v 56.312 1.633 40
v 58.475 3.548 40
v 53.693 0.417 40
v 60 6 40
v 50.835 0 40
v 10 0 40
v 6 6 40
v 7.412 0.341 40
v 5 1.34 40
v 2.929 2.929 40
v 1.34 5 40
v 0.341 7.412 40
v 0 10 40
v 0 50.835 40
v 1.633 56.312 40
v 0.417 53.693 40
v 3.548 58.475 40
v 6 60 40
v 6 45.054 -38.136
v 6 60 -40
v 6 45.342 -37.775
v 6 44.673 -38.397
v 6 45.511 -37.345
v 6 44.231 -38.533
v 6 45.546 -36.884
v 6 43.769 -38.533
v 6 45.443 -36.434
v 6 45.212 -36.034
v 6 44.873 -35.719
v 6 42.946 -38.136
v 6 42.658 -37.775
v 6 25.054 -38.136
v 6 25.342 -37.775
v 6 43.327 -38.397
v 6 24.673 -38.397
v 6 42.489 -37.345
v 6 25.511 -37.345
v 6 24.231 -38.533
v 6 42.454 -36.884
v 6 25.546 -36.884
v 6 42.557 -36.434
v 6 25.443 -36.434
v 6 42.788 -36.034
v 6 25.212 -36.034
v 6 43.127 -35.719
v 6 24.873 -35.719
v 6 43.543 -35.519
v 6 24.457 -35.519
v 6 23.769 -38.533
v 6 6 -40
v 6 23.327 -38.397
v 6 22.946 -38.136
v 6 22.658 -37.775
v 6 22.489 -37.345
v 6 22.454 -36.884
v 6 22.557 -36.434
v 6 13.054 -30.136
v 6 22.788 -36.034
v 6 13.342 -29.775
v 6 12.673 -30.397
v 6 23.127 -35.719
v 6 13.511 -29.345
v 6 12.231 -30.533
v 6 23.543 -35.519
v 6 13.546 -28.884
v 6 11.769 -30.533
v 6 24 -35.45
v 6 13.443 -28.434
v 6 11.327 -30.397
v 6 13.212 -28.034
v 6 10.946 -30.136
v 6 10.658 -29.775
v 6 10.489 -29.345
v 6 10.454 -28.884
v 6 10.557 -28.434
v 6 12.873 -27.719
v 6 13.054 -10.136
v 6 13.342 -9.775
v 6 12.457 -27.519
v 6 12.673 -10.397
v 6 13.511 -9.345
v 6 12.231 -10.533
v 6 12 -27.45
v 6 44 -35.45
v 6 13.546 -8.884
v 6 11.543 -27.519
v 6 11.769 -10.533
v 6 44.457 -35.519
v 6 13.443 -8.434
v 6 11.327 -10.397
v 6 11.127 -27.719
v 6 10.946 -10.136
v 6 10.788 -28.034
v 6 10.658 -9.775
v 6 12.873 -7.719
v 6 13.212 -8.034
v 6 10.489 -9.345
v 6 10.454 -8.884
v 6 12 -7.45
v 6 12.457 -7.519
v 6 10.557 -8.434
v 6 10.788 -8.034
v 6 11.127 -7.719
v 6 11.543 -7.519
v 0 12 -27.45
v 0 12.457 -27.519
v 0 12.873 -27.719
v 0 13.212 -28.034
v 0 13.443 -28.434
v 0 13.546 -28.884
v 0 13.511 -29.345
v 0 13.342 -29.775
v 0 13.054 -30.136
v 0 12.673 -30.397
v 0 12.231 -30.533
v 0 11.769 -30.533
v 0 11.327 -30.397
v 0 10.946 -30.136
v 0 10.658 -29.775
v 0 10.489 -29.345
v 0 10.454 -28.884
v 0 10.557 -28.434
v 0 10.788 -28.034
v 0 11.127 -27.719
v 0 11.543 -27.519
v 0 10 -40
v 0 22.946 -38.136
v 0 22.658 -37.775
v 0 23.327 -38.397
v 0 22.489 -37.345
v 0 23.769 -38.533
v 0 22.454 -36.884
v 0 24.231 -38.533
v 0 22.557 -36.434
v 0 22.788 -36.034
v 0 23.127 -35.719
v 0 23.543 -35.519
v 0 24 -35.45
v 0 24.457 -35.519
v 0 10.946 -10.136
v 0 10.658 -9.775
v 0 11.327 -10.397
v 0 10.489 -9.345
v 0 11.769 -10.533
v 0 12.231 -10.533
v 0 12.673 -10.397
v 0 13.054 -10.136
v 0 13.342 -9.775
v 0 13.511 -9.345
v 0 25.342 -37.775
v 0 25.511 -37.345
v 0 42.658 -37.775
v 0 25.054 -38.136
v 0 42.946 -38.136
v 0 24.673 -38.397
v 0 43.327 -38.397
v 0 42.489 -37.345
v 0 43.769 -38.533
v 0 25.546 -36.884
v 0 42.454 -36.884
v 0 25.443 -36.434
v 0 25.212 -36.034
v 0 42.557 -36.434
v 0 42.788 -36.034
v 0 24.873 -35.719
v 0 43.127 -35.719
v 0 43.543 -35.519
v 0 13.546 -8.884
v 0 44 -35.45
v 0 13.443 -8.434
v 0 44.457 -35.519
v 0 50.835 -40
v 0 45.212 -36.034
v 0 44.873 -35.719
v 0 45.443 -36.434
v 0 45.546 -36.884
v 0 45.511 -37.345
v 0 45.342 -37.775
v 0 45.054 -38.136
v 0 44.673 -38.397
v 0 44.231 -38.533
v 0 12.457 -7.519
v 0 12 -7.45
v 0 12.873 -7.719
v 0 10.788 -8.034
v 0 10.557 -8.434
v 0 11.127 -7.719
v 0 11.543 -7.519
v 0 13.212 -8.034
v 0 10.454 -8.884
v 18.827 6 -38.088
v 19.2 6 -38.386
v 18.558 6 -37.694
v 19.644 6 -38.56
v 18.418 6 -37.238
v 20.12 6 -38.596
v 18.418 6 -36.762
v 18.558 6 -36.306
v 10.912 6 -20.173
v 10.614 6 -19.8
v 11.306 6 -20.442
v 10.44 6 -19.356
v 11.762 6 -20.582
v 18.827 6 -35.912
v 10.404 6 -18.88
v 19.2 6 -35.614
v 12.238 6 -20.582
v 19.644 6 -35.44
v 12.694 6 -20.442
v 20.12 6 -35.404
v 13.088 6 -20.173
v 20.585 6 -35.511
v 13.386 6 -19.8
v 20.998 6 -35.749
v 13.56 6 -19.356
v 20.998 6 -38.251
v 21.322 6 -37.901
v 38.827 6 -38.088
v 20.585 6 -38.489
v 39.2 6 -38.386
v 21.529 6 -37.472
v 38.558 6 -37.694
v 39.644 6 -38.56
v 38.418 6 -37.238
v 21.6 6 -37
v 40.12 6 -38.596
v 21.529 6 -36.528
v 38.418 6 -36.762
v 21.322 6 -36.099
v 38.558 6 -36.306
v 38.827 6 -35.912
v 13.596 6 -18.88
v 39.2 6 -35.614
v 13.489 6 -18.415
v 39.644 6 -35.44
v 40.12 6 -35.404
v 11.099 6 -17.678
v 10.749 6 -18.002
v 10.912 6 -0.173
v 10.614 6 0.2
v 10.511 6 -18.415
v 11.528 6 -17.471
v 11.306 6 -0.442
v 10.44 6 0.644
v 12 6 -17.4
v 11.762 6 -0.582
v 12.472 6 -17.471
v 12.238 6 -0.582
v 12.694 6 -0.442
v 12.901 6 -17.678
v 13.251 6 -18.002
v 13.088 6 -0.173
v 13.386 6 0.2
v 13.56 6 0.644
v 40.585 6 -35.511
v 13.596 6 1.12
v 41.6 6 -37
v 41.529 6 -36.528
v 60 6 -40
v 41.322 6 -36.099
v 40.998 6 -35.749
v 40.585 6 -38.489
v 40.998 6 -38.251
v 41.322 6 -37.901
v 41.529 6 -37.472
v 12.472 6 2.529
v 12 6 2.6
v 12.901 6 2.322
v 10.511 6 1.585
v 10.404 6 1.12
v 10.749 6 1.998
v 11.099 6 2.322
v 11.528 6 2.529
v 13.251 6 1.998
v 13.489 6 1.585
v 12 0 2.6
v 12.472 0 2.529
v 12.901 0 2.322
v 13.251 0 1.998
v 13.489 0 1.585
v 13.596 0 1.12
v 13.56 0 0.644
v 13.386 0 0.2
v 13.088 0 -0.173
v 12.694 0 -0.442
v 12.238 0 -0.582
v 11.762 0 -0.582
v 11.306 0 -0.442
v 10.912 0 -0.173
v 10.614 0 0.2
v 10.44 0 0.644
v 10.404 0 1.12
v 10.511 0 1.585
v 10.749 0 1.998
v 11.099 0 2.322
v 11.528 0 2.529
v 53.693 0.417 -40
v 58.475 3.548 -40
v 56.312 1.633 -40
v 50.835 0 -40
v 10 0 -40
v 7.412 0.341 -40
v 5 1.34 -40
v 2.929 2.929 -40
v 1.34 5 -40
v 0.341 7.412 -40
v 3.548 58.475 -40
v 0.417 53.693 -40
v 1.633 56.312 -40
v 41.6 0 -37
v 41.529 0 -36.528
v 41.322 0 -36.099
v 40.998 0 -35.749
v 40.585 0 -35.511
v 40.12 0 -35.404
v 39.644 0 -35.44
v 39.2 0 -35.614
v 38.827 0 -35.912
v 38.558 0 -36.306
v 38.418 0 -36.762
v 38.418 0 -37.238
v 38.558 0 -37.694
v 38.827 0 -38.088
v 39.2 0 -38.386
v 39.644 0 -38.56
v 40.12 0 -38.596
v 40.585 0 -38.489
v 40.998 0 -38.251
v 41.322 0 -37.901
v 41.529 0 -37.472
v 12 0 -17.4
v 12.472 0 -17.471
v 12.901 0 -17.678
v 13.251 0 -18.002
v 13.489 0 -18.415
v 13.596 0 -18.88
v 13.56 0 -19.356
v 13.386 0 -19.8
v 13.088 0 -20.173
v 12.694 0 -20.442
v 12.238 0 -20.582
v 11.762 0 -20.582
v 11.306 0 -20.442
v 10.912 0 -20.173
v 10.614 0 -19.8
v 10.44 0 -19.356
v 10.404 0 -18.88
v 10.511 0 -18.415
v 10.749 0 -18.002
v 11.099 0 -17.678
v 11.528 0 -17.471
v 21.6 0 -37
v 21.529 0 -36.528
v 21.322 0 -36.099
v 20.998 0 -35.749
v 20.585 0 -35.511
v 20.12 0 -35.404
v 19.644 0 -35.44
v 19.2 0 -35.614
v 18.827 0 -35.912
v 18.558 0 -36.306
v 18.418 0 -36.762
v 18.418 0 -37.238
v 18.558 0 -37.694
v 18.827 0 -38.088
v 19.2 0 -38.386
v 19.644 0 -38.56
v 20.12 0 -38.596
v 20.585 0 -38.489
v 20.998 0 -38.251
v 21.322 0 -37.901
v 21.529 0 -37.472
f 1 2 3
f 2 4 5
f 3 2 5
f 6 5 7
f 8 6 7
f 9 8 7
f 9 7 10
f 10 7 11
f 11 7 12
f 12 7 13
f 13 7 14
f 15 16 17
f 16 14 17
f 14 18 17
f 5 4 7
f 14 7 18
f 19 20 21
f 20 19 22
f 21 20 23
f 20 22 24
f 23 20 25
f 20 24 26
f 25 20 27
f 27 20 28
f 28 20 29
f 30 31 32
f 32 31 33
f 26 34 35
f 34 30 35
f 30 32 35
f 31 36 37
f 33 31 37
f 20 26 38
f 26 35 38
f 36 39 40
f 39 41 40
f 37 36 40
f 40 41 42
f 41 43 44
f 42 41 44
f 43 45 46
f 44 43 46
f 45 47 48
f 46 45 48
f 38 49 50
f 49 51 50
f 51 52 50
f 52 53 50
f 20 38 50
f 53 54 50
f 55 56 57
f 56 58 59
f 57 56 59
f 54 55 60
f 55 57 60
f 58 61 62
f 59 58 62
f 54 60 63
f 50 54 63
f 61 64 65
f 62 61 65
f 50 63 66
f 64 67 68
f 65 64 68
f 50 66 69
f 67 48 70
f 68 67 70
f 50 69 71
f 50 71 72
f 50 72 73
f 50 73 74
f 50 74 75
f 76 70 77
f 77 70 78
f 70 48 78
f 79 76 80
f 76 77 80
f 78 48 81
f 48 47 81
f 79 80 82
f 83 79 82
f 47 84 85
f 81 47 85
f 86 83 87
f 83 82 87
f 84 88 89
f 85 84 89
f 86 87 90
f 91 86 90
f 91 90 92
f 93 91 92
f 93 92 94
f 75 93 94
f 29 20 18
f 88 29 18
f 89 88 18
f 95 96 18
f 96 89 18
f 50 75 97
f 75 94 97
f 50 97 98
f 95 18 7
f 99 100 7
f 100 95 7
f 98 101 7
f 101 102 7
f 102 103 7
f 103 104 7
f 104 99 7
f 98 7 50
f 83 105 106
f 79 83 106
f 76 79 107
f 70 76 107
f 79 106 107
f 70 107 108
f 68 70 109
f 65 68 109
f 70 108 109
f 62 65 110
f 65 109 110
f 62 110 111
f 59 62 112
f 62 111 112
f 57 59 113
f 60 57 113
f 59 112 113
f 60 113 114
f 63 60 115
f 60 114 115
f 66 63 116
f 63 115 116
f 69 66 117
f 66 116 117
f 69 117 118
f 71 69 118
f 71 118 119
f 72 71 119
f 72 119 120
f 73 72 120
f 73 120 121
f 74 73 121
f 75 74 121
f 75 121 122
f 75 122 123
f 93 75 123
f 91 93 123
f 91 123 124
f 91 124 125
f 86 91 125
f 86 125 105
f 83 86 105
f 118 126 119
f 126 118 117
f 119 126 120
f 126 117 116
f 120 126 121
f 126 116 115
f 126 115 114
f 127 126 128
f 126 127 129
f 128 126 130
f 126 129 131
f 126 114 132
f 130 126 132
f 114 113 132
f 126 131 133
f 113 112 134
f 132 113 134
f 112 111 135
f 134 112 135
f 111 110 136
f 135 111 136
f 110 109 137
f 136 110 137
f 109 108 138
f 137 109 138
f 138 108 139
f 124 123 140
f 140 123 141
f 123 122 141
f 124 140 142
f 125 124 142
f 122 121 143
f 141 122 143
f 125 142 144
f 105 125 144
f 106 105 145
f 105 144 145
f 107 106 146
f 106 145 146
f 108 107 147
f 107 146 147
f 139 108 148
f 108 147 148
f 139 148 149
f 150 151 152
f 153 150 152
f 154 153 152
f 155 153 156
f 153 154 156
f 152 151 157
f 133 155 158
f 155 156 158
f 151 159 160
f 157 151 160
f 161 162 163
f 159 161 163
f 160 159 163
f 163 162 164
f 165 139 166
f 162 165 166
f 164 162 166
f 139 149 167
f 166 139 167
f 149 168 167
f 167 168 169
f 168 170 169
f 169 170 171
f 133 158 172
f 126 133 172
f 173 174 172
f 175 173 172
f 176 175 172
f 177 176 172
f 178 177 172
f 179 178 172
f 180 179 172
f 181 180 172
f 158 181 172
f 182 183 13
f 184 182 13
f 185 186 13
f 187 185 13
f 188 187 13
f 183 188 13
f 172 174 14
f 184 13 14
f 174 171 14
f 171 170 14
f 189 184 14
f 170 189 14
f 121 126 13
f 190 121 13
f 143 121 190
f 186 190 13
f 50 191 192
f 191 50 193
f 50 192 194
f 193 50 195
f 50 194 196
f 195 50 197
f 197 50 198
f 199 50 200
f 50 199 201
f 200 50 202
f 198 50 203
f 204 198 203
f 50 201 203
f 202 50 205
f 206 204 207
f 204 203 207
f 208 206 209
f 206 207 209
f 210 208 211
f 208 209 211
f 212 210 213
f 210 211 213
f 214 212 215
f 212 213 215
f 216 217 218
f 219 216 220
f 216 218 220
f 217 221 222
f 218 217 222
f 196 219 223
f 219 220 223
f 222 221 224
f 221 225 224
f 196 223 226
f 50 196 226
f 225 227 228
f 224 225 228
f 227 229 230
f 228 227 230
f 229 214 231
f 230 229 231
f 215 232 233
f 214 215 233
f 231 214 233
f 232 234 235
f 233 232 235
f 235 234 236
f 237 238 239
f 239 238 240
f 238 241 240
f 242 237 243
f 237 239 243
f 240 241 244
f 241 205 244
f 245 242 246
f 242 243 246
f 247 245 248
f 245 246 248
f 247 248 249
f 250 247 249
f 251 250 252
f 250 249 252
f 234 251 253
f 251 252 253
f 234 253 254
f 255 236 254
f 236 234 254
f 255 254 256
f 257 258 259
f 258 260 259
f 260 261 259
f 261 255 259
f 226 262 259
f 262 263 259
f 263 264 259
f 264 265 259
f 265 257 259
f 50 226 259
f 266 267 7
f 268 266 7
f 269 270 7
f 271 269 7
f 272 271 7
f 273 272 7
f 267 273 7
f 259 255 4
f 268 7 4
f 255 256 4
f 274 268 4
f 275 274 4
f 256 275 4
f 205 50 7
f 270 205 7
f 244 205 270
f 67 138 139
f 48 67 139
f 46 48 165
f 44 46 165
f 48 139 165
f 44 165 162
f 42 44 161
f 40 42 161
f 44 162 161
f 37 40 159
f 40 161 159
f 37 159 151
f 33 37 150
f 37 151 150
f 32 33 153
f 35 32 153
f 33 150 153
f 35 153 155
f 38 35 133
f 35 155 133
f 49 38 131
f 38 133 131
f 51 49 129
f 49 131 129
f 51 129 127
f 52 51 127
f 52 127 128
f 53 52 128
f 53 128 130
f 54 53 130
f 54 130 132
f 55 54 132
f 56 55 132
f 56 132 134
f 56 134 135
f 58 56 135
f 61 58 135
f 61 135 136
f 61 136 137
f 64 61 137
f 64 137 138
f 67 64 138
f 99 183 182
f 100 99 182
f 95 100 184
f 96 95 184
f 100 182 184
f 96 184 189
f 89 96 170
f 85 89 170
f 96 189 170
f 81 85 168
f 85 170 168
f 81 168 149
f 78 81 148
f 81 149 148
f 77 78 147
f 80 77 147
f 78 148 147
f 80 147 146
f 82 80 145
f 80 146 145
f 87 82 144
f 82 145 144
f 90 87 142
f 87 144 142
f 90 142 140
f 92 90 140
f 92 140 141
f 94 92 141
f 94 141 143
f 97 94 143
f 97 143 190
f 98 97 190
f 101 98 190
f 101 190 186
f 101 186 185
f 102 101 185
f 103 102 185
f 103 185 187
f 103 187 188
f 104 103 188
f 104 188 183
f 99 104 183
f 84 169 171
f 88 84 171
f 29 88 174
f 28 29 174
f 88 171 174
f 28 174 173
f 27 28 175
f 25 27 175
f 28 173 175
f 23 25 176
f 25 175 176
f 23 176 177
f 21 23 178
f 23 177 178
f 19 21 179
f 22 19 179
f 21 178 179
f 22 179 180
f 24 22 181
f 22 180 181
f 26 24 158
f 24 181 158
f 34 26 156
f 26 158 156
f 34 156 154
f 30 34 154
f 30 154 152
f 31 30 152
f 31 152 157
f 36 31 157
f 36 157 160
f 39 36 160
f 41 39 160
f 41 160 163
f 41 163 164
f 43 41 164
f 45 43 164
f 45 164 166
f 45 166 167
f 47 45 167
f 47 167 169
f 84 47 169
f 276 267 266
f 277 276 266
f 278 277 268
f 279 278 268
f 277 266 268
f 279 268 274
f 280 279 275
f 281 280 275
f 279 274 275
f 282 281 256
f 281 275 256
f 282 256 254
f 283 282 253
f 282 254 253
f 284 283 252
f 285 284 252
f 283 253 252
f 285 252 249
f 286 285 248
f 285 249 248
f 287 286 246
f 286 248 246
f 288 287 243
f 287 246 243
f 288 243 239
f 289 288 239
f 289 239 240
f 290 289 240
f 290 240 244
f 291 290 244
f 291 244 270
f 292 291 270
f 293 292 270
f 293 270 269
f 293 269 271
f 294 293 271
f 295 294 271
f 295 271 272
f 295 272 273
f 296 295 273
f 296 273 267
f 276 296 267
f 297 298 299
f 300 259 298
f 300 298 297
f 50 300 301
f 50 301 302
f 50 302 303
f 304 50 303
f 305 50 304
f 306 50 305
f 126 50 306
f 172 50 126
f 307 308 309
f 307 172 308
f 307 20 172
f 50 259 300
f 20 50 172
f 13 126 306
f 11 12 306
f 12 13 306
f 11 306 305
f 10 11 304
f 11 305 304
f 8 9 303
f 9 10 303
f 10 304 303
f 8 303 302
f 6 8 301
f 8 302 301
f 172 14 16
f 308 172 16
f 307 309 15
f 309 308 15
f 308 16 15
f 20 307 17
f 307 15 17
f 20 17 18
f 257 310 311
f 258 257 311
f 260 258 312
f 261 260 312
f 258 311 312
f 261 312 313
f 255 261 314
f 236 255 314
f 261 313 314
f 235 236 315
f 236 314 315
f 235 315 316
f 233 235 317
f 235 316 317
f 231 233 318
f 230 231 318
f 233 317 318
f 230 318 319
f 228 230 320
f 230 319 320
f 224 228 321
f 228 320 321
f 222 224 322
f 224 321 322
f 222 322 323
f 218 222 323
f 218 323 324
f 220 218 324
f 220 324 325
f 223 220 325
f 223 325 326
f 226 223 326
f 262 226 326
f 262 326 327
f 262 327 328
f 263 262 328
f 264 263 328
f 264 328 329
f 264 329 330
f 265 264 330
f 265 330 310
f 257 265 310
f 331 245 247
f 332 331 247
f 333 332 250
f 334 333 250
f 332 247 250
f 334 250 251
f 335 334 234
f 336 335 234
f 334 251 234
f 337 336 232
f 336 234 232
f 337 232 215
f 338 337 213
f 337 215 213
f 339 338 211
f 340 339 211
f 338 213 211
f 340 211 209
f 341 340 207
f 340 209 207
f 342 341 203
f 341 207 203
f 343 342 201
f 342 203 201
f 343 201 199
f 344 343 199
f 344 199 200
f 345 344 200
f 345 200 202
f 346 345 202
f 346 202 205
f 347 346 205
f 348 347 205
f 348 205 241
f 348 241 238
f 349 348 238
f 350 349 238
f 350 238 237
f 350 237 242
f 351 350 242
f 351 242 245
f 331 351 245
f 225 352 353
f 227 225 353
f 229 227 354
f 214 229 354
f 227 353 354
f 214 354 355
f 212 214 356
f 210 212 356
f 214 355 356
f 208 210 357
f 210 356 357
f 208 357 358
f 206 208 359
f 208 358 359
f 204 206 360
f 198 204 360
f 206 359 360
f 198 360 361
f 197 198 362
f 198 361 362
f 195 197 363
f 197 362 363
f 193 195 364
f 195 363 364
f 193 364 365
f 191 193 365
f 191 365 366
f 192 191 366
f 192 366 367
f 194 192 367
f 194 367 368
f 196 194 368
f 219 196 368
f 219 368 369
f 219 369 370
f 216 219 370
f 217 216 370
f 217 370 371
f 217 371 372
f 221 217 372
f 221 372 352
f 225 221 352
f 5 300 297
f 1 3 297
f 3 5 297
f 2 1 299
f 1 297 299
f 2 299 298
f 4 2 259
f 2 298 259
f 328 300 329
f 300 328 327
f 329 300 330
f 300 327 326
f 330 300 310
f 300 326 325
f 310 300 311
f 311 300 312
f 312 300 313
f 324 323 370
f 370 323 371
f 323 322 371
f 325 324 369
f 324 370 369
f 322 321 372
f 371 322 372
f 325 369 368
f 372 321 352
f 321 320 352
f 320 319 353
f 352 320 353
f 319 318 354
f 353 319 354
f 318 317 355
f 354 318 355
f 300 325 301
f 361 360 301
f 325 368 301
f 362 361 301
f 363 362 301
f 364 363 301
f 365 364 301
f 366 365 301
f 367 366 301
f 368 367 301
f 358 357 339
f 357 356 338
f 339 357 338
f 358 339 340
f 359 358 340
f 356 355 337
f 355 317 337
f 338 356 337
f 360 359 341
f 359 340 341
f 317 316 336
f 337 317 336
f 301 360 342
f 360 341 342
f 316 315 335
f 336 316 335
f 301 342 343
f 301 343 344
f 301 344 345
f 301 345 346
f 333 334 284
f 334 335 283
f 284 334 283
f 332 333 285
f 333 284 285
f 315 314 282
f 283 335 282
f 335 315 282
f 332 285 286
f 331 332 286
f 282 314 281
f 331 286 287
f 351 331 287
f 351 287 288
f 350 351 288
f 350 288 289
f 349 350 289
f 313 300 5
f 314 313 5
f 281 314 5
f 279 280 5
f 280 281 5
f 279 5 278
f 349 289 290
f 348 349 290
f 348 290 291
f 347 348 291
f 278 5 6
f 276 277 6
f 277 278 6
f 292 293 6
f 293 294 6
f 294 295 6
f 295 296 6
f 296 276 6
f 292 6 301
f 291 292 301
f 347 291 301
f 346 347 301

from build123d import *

# Parameters (mm, degrees)
EXTRUDE_1_DEPTH     = 40
FILLET_1_R          = 10
SKETCH_3_R          = 1.55
CUT_EXTRUDE_1_DEPTH = 94.808315196
SKETCH_4_R          = 1.6
CUT_EXTRUDE_2_DEPTH = 91.088845036
SKETCH_5_R          = 1.6
CUT_EXTRUDE_3_DEPTH = 94.808315196


with BuildPart() as part:
    # 草图1 → 凸台-拉伸1 (new, symmetric)
    with BuildSketch(Plane.XY):
        Polygon((0, 0), (0, 60), (6, 60), (6, 6), (60, 6), (60, 0), align=None)
    extrude(amount=EXTRUDE_1_DEPTH, both=True)

    # 圆角1
    # the kernel refuses this fillet: 10 mm, written as the material it takes off along each edge
    with BuildSketch(Plane(origin=(0, 60, 62.912878475), x_dir=(0, -1, 0), z_dir=(0, 0, -1))) as fillet_1_piece_1:
        with BuildLine():
            CenterArc((9.16515139, -10), FILLET_1_R, 90, 66.421821522)
            Line((0, -6), (-0.183303028, -5.92))
            ThreePointArc((-0.183303028, -5.92), (-0.2, -3), (-0.2, 0))
            Line((-0.2, 0), (0, 0.2))
            Line((0, 0.2), (9.16515139, 0.2))
            Line((9.16515139, 0.2), (9.16515139, 0))
        make_face()
    extrude(amount=125.82575695, mode=Mode.SUBTRACT)
    with BuildSketch(Plane(origin=(60, 0, -62.912878475), x_dir=(0, 1, 0), z_dir=(0, 0, 1))) as fillet_1_piece_2:
        with BuildLine():
            CenterArc((10, 9.16515139), FILLET_1_R, 180, 66.421821522)
            Line((0, 9.16515139), (-0.2, 9.16515139))
            Line((-0.2, 9.16515139), (-0.2, 0))
            Line((-0.2, 0), (0, -0.2))
            ThreePointArc((0, -0.2), (3, -0.2), (5.92, -0.183303028))
            Line((5.92, -0.183303028), (6, 0))
        make_face()
    extrude(amount=125.82575695, mode=Mode.SUBTRACT)
    with BuildSketch(Plane(origin=(0, 0, -65), x_dir=(0, 1, 0), z_dir=(0, 0, 1))) as fillet_1_piece_3:
        with BuildLine():
            CenterArc((FILLET_1_R, -FILLET_1_R), FILLET_1_R, 90, 90)
            Line((0, -FILLET_1_R), (-FILLET_1_R * 0.02, -FILLET_1_R))
            Line((-FILLET_1_R * 0.02, -FILLET_1_R), (-FILLET_1_R * 0.02, FILLET_1_R * 0.02))
            Line((-FILLET_1_R * 0.02, FILLET_1_R * 0.02), (FILLET_1_R, FILLET_1_R * 0.02))
            Line((FILLET_1_R, FILLET_1_R * 0.02), (FILLET_1_R, 0))
        make_face()
    extrude(amount=130, mode=Mode.SUBTRACT)

    # 草图3 → 切除-拉伸1 (cut, through all)
    with BuildSketch(Plane.ZY):
        with Locations((-37, 44)):
            Circle(SKETCH_3_R)
        with Locations((-37, 24)):
            Circle(SKETCH_3_R)
        with Locations((-29, 12)):
            Circle(SKETCH_3_R)
        with Locations((-9, 12)):
            Circle(SKETCH_3_R)
    extrude(amount=-CUT_EXTRUDE_1_DEPTH, mode=Mode.SUBTRACT)

    # 草图4 → 切除-拉伸2 (cut, through all)
    with BuildSketch(Plane(origin=(0, 6, 0), x_dir=(1, 0, 0), z_dir=(0, 1, 0))):
        with Locations(Location((12, -1, 0), (0, 0, 270))):
            Circle(SKETCH_4_R)
        with Locations(Location((12, 19, 0), (0, 0, 270))):
            Circle(SKETCH_4_R)
    extrude(amount=-CUT_EXTRUDE_2_DEPTH, mode=Mode.SUBTRACT)

    # 草图5 → 切除-拉伸3 (cut, through all)
    with BuildSketch(Plane.XZ):
        with Locations((20, -37)):
            Circle(SKETCH_5_R)
        with Locations((40, -37)):
            Circle(SKETCH_5_R)
    extrude(amount=-CUT_EXTRUDE_3_DEPTH, mode=Mode.SUBTRACT)


solid = part.part
